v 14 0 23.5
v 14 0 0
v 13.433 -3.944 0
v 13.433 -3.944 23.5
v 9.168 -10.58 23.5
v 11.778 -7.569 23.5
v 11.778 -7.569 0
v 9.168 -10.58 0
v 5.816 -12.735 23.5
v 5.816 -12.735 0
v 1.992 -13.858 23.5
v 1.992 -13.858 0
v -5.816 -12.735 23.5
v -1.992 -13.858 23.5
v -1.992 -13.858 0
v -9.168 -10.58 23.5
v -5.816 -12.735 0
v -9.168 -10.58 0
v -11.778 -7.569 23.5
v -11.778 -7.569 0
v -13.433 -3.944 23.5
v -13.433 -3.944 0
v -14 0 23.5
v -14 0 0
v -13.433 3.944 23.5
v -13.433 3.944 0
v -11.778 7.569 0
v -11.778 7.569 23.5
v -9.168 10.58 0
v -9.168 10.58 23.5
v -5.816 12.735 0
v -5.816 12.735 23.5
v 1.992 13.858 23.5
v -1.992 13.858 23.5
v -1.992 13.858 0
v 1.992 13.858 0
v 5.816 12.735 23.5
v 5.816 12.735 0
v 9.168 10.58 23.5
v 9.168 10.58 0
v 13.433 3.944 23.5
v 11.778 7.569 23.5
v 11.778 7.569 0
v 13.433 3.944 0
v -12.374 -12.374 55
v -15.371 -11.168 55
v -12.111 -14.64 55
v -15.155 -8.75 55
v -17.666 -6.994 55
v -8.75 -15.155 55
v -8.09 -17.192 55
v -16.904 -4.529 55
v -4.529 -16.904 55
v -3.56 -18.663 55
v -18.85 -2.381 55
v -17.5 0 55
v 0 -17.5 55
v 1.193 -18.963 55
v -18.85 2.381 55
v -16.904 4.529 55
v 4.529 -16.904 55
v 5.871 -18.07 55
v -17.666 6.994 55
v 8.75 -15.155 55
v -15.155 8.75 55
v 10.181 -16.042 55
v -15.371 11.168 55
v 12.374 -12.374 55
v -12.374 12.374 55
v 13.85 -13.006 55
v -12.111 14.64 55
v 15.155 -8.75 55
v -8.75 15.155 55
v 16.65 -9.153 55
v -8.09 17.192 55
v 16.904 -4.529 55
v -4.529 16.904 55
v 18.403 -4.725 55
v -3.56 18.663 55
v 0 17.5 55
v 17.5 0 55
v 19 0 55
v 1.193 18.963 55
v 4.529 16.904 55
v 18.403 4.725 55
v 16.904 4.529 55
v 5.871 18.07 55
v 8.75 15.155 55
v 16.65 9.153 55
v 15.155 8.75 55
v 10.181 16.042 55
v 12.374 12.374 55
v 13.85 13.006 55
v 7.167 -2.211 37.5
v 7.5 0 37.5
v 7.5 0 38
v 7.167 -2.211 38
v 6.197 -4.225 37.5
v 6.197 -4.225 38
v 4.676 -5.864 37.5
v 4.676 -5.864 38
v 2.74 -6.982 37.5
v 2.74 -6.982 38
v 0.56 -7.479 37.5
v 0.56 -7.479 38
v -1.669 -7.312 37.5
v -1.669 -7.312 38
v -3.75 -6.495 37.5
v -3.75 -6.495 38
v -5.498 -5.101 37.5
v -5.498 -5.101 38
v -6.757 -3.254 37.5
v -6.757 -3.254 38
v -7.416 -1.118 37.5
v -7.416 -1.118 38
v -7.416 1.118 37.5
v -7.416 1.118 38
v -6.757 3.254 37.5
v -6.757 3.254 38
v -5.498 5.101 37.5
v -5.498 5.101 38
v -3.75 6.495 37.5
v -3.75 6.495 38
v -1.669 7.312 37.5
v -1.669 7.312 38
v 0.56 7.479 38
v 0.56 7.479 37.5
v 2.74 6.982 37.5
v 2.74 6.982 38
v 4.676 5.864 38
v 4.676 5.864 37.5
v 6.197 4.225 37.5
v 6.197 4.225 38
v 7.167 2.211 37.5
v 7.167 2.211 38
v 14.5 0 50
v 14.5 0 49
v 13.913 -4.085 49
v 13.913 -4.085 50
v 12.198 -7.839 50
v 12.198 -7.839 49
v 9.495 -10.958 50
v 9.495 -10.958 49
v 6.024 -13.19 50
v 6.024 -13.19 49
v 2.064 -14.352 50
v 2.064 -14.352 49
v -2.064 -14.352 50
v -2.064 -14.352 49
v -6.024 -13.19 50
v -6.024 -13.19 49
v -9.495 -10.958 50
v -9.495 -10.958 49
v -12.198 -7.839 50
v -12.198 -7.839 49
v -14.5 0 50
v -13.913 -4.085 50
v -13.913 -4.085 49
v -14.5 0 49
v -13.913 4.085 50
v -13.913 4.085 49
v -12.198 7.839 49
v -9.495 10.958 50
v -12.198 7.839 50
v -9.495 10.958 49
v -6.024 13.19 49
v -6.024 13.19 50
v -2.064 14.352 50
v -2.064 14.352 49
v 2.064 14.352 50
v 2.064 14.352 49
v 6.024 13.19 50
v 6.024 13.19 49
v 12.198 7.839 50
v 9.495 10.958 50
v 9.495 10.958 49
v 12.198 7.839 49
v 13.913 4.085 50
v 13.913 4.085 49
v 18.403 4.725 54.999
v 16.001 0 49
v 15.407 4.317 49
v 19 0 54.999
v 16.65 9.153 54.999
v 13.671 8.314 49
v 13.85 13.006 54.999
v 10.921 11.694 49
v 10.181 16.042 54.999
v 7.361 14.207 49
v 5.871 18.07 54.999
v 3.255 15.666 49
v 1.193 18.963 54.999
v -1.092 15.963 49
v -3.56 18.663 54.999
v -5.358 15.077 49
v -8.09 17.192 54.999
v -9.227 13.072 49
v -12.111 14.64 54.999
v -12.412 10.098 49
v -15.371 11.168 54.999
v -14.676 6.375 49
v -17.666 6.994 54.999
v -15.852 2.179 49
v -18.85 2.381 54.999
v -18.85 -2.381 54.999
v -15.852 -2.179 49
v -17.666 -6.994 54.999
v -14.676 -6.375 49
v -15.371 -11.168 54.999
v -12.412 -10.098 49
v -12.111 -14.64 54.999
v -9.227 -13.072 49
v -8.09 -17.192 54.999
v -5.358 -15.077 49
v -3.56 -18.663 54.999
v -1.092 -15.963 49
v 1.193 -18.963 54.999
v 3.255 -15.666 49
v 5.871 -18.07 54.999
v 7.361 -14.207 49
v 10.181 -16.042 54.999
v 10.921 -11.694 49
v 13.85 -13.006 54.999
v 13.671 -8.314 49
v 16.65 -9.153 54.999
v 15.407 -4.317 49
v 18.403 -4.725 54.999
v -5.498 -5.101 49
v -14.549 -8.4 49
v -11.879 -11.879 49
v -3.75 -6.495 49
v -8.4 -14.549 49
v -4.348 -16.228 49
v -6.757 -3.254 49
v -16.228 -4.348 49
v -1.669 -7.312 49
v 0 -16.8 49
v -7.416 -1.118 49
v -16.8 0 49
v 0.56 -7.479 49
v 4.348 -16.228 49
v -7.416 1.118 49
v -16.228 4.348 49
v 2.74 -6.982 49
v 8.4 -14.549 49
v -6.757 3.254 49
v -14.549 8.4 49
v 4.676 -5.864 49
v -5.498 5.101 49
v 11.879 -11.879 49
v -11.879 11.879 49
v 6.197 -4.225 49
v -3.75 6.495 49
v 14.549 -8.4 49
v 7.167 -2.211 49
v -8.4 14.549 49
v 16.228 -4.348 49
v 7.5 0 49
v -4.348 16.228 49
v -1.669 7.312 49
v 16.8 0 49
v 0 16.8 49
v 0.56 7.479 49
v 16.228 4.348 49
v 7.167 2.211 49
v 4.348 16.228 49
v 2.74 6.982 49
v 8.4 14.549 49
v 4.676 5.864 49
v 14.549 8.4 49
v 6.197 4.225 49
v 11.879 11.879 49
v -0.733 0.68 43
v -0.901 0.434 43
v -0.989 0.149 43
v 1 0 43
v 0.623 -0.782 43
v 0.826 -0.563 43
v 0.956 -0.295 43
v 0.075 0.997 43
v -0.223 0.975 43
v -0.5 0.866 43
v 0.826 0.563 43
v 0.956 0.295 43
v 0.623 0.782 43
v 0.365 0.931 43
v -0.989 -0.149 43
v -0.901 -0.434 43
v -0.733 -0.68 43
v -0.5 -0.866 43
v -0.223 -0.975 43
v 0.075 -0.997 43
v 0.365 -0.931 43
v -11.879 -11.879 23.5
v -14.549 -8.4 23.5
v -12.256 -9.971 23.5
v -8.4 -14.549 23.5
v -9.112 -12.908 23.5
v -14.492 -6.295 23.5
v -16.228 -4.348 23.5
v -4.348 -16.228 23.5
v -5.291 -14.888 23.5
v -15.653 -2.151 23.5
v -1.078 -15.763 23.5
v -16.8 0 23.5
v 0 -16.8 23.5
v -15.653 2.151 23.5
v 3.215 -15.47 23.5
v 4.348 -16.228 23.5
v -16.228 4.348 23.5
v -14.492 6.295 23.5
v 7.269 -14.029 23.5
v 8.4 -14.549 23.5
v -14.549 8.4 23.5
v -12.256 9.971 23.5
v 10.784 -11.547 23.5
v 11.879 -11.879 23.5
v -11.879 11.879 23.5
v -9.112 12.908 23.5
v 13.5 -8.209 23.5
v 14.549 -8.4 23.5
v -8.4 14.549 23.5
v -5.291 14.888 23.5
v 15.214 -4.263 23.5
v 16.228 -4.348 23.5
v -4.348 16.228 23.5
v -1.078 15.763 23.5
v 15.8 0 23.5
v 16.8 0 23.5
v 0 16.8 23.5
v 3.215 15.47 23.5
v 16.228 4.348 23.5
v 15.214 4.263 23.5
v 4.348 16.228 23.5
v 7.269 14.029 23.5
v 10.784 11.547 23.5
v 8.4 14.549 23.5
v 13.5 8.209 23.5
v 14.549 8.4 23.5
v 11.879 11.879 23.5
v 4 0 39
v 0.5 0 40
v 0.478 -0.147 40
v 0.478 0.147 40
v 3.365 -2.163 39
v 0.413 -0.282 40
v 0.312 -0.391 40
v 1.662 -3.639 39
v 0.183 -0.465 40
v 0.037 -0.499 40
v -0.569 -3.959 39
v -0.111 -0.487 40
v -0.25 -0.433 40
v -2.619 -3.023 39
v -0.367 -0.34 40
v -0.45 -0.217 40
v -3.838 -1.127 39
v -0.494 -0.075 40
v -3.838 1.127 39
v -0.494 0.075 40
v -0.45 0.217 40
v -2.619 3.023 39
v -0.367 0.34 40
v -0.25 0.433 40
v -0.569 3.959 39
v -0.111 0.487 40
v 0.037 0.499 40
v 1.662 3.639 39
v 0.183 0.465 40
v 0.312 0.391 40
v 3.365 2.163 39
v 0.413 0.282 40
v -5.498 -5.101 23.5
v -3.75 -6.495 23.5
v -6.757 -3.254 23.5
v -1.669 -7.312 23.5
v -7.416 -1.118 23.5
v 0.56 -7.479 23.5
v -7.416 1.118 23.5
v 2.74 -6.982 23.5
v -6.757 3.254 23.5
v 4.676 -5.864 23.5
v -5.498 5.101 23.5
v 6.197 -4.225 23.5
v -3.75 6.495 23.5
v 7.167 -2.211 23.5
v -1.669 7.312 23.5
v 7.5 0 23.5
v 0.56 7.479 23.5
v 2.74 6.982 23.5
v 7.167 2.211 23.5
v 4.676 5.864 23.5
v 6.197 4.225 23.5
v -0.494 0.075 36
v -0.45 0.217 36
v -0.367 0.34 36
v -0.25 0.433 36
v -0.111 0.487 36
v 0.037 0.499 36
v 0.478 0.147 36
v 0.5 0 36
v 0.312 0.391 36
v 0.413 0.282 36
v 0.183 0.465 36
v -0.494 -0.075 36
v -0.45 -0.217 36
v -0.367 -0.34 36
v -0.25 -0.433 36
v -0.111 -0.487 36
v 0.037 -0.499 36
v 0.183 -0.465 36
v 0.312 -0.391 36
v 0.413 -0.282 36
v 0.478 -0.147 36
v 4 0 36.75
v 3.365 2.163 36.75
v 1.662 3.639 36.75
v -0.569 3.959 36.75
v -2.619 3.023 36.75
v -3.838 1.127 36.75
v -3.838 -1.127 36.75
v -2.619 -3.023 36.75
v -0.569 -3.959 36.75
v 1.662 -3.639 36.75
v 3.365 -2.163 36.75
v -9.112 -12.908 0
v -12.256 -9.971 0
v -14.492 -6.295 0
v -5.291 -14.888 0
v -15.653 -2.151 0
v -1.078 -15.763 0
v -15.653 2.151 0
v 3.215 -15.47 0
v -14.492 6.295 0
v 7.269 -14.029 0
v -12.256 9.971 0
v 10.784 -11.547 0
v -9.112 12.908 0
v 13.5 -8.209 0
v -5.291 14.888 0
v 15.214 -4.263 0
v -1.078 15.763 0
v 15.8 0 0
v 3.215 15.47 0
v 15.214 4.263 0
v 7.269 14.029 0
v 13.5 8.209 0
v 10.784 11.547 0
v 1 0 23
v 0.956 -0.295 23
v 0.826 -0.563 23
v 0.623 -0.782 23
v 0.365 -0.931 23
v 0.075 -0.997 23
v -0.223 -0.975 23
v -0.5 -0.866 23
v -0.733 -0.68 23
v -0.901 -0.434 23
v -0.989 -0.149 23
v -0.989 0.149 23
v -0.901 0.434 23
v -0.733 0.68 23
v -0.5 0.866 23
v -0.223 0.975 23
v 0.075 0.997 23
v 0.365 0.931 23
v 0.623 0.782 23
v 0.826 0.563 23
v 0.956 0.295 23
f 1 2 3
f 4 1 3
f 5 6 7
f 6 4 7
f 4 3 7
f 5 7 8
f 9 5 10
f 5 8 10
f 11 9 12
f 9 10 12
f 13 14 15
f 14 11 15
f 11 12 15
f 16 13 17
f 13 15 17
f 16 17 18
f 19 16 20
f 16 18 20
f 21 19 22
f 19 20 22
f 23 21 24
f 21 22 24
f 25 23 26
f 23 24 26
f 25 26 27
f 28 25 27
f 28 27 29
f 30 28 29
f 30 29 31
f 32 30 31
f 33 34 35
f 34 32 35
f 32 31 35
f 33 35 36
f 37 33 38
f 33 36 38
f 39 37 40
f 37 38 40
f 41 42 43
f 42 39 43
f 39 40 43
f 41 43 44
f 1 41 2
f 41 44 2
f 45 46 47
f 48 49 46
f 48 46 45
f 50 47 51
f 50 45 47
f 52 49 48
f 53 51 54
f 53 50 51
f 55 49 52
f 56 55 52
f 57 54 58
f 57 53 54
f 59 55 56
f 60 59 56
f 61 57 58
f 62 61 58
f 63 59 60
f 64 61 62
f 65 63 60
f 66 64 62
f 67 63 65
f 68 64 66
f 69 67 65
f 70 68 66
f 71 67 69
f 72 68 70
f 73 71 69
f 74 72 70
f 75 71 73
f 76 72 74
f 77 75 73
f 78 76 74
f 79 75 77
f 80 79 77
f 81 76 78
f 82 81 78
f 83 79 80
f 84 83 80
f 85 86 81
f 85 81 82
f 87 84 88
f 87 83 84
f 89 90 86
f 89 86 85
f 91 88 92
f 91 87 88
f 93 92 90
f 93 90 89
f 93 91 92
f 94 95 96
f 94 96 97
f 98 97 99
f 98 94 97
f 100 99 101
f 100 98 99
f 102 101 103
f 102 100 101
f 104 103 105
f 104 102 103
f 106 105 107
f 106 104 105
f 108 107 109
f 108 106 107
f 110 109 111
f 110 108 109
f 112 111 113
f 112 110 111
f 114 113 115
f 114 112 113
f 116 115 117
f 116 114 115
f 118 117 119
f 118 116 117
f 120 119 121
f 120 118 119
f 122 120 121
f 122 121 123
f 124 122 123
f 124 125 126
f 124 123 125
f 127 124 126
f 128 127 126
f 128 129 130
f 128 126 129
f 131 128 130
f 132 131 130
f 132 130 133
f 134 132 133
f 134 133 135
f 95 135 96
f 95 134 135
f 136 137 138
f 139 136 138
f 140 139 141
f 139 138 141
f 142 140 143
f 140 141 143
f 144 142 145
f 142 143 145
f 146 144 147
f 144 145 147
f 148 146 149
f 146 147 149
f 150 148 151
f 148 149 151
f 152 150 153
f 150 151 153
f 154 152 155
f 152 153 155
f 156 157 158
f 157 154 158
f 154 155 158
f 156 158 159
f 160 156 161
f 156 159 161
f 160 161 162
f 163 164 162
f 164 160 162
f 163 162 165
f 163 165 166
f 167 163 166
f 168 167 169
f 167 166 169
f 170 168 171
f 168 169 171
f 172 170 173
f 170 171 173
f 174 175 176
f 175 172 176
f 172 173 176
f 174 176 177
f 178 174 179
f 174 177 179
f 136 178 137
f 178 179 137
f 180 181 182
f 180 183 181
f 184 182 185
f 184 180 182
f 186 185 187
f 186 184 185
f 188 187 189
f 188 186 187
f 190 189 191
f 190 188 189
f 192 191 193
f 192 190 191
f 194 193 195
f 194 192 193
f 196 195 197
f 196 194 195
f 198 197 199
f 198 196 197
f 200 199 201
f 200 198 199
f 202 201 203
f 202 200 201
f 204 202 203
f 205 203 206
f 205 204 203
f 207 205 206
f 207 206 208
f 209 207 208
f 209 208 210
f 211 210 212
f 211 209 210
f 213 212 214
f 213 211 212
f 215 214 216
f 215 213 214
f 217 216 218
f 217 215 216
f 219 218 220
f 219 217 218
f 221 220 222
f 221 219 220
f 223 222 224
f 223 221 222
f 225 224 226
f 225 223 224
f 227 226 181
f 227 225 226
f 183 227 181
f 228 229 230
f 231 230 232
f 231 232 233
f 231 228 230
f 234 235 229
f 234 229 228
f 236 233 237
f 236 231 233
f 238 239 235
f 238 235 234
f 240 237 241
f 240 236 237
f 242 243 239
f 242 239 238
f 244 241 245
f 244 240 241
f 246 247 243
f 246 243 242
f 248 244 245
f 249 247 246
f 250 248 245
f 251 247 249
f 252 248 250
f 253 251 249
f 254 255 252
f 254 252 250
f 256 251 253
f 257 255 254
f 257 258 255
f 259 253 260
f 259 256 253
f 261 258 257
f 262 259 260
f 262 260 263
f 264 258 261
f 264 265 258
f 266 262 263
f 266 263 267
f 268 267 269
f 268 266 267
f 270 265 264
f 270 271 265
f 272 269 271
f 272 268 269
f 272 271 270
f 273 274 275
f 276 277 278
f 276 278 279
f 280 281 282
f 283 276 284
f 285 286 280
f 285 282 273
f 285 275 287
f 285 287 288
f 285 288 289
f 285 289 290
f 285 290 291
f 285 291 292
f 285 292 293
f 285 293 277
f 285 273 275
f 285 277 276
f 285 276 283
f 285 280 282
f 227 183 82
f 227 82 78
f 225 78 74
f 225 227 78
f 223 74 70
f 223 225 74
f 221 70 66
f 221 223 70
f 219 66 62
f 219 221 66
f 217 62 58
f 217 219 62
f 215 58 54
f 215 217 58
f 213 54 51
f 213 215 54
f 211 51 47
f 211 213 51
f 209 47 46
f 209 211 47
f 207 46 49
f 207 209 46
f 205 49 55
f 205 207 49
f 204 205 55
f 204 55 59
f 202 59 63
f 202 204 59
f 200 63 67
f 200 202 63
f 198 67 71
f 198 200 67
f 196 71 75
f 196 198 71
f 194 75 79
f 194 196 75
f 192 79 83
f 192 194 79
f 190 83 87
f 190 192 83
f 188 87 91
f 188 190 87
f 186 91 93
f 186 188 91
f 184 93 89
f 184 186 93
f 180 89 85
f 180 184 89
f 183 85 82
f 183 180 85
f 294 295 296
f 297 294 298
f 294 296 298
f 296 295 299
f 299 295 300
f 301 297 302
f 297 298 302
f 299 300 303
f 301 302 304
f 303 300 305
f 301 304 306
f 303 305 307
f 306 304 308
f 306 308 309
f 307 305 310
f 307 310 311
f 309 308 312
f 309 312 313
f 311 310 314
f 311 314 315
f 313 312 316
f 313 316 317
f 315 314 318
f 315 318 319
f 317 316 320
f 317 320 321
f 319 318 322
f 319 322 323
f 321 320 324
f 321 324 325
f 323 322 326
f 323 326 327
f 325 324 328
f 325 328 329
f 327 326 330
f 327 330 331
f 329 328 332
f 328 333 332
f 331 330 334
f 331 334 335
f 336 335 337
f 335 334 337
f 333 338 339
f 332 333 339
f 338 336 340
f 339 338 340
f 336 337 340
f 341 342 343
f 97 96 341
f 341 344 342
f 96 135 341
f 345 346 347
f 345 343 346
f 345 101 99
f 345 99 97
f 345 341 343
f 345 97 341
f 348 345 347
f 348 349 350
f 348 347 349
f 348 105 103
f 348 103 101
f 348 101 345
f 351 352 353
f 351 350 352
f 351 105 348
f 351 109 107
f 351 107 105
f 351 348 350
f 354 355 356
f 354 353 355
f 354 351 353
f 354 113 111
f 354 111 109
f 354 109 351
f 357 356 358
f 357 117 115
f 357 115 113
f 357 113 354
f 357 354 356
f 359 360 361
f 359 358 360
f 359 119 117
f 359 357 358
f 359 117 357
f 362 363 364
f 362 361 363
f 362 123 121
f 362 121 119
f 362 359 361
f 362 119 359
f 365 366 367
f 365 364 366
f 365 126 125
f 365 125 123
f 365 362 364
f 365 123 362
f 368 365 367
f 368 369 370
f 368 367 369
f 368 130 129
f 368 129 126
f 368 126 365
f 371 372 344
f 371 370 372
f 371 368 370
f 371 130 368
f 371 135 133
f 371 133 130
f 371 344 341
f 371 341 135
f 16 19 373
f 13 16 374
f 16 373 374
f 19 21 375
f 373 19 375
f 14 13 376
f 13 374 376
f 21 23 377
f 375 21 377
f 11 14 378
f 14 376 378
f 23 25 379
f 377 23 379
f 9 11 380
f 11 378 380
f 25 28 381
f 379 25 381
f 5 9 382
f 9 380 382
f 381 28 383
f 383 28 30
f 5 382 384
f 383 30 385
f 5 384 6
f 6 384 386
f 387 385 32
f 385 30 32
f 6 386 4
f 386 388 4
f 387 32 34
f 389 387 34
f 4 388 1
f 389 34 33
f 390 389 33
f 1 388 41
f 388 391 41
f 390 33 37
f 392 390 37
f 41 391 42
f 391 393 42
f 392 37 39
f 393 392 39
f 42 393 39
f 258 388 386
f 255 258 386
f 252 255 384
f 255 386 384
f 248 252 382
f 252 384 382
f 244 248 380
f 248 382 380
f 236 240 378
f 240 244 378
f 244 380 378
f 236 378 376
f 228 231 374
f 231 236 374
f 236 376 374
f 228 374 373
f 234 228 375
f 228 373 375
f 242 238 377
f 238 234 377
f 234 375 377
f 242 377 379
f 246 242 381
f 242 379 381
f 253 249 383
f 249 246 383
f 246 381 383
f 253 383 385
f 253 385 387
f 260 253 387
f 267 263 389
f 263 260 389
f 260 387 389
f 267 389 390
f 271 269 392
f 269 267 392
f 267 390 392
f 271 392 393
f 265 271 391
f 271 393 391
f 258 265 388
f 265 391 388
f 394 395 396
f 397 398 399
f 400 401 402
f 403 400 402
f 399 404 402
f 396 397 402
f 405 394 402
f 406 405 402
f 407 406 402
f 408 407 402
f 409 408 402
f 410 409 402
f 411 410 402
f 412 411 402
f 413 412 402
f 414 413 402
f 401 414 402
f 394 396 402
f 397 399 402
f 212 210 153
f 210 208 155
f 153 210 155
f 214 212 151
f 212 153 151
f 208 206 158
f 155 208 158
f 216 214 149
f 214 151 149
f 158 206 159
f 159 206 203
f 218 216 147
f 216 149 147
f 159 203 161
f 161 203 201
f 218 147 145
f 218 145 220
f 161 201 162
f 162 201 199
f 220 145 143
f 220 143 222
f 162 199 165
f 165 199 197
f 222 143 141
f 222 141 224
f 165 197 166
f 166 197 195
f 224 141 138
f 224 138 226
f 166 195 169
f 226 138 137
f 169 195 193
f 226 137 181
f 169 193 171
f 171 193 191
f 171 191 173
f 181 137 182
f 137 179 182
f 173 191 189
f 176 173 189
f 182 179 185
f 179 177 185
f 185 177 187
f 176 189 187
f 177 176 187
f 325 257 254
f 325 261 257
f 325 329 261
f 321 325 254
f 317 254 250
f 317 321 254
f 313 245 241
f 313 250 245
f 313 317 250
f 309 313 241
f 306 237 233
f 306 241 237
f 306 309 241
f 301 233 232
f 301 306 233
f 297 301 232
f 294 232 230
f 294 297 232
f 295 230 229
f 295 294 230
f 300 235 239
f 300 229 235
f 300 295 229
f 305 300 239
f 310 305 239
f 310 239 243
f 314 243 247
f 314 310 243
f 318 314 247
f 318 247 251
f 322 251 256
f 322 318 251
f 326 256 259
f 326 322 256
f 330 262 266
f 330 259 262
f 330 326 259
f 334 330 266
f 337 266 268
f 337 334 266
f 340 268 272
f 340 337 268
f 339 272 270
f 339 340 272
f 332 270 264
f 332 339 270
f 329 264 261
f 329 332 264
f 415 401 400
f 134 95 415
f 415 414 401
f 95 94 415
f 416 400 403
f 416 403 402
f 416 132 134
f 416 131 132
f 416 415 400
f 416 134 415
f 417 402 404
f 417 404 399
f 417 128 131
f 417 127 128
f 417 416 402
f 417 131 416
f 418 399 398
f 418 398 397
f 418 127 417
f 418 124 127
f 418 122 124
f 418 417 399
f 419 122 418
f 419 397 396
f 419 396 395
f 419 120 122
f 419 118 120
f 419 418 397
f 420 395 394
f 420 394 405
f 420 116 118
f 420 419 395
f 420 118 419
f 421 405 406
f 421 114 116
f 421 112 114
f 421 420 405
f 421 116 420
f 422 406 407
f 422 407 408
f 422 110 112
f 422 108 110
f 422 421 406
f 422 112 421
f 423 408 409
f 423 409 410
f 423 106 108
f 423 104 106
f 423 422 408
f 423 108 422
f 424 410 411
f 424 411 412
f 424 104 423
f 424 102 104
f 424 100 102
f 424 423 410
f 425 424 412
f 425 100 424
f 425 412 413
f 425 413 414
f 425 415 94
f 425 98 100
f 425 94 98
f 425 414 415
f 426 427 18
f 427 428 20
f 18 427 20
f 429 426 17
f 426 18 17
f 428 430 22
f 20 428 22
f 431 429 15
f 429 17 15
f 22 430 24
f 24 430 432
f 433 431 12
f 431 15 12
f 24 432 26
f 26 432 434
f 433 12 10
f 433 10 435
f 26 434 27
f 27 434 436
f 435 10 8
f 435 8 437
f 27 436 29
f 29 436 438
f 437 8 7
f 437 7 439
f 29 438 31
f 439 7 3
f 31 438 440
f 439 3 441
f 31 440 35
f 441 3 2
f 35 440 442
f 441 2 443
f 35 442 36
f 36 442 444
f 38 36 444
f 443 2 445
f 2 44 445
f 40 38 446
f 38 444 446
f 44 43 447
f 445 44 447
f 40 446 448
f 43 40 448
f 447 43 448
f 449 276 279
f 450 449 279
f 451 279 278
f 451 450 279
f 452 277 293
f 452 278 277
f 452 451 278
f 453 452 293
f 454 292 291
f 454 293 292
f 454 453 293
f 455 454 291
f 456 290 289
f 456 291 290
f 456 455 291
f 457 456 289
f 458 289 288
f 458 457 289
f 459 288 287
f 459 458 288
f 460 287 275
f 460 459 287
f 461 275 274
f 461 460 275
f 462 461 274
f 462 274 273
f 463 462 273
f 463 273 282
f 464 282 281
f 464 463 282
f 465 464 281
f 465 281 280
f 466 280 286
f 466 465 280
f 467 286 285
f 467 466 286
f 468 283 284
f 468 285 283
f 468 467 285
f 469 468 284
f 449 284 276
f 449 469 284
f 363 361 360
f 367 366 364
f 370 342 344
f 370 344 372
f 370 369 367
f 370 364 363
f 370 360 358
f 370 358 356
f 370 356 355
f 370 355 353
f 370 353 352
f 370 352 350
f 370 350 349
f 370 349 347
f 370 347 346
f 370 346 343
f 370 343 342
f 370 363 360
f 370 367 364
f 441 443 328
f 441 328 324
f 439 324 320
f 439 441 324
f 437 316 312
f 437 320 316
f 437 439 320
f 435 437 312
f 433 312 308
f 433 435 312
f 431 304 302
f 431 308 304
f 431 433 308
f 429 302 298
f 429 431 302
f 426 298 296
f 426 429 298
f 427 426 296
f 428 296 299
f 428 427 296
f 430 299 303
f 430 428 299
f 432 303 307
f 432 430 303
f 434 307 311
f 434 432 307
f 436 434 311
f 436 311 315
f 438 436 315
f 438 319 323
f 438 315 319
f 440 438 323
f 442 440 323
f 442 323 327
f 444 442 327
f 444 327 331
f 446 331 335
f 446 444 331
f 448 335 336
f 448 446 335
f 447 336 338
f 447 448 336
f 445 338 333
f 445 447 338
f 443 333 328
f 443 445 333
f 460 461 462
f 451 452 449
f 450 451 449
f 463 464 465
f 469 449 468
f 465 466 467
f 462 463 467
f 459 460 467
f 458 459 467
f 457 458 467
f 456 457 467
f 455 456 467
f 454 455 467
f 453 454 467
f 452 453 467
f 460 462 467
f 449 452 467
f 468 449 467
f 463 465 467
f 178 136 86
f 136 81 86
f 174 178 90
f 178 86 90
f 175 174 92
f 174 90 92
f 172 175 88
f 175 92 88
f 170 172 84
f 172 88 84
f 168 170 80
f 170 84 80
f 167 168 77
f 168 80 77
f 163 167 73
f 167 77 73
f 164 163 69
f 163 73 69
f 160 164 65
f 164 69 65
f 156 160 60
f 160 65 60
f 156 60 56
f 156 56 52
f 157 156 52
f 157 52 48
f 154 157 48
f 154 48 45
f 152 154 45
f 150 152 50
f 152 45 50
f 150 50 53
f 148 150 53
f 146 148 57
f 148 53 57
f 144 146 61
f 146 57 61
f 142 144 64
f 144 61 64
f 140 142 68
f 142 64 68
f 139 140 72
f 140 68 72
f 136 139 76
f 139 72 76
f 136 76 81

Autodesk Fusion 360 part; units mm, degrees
sketch "Esquisse1" plane through (0, 0, 0) normal (0, 0, 1) x (1, 0, 0)
  circle A0 centre (0, 0) radius 15.8
  circle A1 centre (0, 0) radius 16.8
  circle A2 centre (0, 0) radius 14
  circle A3 centre (0, 0) radius 7.5
  circle A4 centre (0, 0) radius 1
  dimension "d1" = 31.6
  dimension "d2" = 33.6
  dimension "d3" = 28
  dimension "d10" = 15
  dimension "d11" = 2
extrude "Extrusion1" add sketch "Esquisse1" along normal blind 23.5 contours A0 makes body 1
extrude "Extrusion2" add sketch "Esquisse1" along normal blind 49 and the other way blind -23.5 contours A0 | A1 | A2 bodies 1
extrude "Extrusion4" add sketch "Esquisse1" along normal blind 40 and the other way blind -36 separate body contours A3 | A4 makes body 2
chamfer "Chanfrein1" distance 7 distance2 2 1 edges at (-6.9925, -2.7121, 40) measured on face at (1.9158, 2.8099, 40) on bodies 2
chamfer "Chanfrein2" distance 1.5 distance2 7 1 edges at (-6.9925, -2.7121, 36) measured on face at (7.4627, -0.7468, 36.6667) on bodies 2
extrude "Extrusion3" add sketch "Esquisse1" along normal blind 43 and the other way blind -23 separate body contours A4 makes body 3
sketch "Esquisse1 (2)" plane through (0, 0, 0) normal (0, 0, 1) x (1, 0, 0) in component "cahoutchouc"
  circle A0 centre (0, 0) radius 14.5
  circle A1 centre (0, 0) radius 19
  dimension "d24" = 29
  dimension "d25" = 38
extrude "Extrusion1'" add sketch "Esquisse1 (2)" along normal blind 6 separate body makes body 4 in component "cahoutchouc"
chamfer "Chanfrein1'" distance 3 distance2 5 1 edges at (-13.5187, 5.2434, 6) measured on face at (17.3753, -1.6643, 6) on bodies 4 in component "cahoutchouc"
chamfer "Chanfrein2'" distance 6 distance2 3 1 edges at (-17.7142, -6.8707, 0) measured on face at (18.9764, -0.9471, 4) on bodies 4 in component "cahoutchouc"
component "cahoutchouc" placed x (1, 0, 0) y (0, 1, 0) z (0, 0, 1) at (0, 0, 49)
